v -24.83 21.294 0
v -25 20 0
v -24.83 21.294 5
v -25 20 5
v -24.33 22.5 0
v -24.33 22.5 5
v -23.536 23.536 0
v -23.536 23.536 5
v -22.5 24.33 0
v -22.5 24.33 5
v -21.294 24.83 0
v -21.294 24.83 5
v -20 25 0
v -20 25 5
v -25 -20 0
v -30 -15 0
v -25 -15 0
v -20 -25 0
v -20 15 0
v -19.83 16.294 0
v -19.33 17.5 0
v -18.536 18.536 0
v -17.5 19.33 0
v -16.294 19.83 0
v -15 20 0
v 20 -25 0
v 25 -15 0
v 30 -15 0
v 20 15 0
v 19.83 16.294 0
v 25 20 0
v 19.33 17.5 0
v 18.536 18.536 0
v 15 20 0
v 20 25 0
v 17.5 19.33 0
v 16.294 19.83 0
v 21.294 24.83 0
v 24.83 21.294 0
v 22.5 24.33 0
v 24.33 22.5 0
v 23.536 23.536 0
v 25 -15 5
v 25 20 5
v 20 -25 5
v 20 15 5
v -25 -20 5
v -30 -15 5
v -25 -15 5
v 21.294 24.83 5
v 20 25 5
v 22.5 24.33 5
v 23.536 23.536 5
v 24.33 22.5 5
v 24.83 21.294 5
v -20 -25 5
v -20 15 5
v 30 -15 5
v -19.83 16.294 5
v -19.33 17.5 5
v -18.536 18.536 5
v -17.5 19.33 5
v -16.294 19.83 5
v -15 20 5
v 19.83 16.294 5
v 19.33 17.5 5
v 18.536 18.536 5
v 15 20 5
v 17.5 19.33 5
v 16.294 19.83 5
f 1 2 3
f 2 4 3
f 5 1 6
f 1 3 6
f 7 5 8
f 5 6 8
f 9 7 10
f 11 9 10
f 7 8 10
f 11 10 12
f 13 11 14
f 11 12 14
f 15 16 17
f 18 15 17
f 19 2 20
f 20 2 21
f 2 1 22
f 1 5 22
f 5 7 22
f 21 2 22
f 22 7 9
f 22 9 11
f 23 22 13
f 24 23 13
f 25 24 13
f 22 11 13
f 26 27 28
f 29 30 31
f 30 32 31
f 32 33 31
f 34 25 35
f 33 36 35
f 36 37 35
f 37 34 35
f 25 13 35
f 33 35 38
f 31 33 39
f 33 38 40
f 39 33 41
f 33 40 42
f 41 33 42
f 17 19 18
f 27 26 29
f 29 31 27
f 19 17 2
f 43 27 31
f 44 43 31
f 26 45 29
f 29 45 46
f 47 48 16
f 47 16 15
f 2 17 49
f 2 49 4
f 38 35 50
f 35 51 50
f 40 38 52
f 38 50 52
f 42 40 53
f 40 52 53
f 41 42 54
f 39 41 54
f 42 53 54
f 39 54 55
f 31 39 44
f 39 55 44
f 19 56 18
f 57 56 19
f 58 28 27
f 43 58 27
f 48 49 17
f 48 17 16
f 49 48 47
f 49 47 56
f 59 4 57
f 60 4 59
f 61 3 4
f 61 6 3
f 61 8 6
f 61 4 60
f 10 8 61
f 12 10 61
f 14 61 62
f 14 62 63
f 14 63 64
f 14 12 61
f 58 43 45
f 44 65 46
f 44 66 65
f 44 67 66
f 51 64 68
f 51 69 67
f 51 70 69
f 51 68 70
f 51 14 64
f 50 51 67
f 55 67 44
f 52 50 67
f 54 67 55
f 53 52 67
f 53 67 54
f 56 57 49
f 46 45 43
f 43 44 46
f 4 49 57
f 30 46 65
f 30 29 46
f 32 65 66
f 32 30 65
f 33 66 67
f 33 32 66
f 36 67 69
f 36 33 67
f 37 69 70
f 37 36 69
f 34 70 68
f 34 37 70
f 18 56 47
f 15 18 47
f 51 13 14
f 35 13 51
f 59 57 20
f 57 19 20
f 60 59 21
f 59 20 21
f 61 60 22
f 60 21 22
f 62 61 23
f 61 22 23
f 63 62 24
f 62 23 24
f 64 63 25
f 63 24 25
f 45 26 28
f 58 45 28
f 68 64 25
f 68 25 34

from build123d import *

# Parameters (mm, degrees)
F0_W      = 50
F0_H      = 50
F1_DEPTH  = 5
F2_W      = 40
F2_H      = 45
F3_DEPTH  = 5.001
F4_R      = 5
F6_DEPTH  = 5
F8_DEPTH  = 5.001
F10_DEPTH = 5
F12_DEPTH = 5.001


# Not quite as in the source:
# - ends of sketch curves that miss each other by under 0.0002 mm in the source are joined


with BuildPart() as f1:
    # F0 (on Top) → F1 (new body)
    with BuildSketch(Plane.XY):
        Rectangle(F0_W, F0_H)
    extrude(amount=F1_DEPTH)

    # F2 (on face) → F3 (cut, through all)
    with BuildSketch(Plane.XY.offset(5)):
        with Locations((0, -2.5)):
            Rectangle(F2_W, F2_H)
    extrude(amount=-F3_DEPTH, mode=Mode.SUBTRACT)

    # F4
    f4_edges = [f1.edges().sort_by_distance(p)[0] for p in [
        (-20, 20, 2.5),
        (20, 20, 2.5),
        (25, 25, 2.5),
        (-25, 25, 2.5),
    ]]
    fillet(f4_edges, radius=F4_R)

    # F5 (on face) → F6 (join)
    with BuildSketch(Plane.XY.offset(5)):
        Polygon((-25, -19.9999040991), (-25, -15), (-30, -15), align=None)
    extrude(amount=-F6_DEPTH)

    # F7 (on face) → F8 (cut, through all)
    with BuildSketch(Plane.XY.offset(5)):
        Polygon((-20, -25), (-25.0000479505, -19.9999520495), (-25, -25), align=None)
    extrude(amount=-F8_DEPTH, mode=Mode.SUBTRACT)

    # F9 (on Top) → F10 (join)
    with BuildSketch(Plane.XY):
        Polygon((30, -15), (25, -15), (25, -20), align=None)
    extrude(amount=F10_DEPTH)

    # F11 (on face) → F12 (cut, through all)
    with BuildSketch(Plane.XY.offset(5)):
        Polygon((25, -25), (25, -20), (20, -25), align=None)
    extrude(amount=-F12_DEPTH, mode=Mode.SUBTRACT)


solid = f1.part
